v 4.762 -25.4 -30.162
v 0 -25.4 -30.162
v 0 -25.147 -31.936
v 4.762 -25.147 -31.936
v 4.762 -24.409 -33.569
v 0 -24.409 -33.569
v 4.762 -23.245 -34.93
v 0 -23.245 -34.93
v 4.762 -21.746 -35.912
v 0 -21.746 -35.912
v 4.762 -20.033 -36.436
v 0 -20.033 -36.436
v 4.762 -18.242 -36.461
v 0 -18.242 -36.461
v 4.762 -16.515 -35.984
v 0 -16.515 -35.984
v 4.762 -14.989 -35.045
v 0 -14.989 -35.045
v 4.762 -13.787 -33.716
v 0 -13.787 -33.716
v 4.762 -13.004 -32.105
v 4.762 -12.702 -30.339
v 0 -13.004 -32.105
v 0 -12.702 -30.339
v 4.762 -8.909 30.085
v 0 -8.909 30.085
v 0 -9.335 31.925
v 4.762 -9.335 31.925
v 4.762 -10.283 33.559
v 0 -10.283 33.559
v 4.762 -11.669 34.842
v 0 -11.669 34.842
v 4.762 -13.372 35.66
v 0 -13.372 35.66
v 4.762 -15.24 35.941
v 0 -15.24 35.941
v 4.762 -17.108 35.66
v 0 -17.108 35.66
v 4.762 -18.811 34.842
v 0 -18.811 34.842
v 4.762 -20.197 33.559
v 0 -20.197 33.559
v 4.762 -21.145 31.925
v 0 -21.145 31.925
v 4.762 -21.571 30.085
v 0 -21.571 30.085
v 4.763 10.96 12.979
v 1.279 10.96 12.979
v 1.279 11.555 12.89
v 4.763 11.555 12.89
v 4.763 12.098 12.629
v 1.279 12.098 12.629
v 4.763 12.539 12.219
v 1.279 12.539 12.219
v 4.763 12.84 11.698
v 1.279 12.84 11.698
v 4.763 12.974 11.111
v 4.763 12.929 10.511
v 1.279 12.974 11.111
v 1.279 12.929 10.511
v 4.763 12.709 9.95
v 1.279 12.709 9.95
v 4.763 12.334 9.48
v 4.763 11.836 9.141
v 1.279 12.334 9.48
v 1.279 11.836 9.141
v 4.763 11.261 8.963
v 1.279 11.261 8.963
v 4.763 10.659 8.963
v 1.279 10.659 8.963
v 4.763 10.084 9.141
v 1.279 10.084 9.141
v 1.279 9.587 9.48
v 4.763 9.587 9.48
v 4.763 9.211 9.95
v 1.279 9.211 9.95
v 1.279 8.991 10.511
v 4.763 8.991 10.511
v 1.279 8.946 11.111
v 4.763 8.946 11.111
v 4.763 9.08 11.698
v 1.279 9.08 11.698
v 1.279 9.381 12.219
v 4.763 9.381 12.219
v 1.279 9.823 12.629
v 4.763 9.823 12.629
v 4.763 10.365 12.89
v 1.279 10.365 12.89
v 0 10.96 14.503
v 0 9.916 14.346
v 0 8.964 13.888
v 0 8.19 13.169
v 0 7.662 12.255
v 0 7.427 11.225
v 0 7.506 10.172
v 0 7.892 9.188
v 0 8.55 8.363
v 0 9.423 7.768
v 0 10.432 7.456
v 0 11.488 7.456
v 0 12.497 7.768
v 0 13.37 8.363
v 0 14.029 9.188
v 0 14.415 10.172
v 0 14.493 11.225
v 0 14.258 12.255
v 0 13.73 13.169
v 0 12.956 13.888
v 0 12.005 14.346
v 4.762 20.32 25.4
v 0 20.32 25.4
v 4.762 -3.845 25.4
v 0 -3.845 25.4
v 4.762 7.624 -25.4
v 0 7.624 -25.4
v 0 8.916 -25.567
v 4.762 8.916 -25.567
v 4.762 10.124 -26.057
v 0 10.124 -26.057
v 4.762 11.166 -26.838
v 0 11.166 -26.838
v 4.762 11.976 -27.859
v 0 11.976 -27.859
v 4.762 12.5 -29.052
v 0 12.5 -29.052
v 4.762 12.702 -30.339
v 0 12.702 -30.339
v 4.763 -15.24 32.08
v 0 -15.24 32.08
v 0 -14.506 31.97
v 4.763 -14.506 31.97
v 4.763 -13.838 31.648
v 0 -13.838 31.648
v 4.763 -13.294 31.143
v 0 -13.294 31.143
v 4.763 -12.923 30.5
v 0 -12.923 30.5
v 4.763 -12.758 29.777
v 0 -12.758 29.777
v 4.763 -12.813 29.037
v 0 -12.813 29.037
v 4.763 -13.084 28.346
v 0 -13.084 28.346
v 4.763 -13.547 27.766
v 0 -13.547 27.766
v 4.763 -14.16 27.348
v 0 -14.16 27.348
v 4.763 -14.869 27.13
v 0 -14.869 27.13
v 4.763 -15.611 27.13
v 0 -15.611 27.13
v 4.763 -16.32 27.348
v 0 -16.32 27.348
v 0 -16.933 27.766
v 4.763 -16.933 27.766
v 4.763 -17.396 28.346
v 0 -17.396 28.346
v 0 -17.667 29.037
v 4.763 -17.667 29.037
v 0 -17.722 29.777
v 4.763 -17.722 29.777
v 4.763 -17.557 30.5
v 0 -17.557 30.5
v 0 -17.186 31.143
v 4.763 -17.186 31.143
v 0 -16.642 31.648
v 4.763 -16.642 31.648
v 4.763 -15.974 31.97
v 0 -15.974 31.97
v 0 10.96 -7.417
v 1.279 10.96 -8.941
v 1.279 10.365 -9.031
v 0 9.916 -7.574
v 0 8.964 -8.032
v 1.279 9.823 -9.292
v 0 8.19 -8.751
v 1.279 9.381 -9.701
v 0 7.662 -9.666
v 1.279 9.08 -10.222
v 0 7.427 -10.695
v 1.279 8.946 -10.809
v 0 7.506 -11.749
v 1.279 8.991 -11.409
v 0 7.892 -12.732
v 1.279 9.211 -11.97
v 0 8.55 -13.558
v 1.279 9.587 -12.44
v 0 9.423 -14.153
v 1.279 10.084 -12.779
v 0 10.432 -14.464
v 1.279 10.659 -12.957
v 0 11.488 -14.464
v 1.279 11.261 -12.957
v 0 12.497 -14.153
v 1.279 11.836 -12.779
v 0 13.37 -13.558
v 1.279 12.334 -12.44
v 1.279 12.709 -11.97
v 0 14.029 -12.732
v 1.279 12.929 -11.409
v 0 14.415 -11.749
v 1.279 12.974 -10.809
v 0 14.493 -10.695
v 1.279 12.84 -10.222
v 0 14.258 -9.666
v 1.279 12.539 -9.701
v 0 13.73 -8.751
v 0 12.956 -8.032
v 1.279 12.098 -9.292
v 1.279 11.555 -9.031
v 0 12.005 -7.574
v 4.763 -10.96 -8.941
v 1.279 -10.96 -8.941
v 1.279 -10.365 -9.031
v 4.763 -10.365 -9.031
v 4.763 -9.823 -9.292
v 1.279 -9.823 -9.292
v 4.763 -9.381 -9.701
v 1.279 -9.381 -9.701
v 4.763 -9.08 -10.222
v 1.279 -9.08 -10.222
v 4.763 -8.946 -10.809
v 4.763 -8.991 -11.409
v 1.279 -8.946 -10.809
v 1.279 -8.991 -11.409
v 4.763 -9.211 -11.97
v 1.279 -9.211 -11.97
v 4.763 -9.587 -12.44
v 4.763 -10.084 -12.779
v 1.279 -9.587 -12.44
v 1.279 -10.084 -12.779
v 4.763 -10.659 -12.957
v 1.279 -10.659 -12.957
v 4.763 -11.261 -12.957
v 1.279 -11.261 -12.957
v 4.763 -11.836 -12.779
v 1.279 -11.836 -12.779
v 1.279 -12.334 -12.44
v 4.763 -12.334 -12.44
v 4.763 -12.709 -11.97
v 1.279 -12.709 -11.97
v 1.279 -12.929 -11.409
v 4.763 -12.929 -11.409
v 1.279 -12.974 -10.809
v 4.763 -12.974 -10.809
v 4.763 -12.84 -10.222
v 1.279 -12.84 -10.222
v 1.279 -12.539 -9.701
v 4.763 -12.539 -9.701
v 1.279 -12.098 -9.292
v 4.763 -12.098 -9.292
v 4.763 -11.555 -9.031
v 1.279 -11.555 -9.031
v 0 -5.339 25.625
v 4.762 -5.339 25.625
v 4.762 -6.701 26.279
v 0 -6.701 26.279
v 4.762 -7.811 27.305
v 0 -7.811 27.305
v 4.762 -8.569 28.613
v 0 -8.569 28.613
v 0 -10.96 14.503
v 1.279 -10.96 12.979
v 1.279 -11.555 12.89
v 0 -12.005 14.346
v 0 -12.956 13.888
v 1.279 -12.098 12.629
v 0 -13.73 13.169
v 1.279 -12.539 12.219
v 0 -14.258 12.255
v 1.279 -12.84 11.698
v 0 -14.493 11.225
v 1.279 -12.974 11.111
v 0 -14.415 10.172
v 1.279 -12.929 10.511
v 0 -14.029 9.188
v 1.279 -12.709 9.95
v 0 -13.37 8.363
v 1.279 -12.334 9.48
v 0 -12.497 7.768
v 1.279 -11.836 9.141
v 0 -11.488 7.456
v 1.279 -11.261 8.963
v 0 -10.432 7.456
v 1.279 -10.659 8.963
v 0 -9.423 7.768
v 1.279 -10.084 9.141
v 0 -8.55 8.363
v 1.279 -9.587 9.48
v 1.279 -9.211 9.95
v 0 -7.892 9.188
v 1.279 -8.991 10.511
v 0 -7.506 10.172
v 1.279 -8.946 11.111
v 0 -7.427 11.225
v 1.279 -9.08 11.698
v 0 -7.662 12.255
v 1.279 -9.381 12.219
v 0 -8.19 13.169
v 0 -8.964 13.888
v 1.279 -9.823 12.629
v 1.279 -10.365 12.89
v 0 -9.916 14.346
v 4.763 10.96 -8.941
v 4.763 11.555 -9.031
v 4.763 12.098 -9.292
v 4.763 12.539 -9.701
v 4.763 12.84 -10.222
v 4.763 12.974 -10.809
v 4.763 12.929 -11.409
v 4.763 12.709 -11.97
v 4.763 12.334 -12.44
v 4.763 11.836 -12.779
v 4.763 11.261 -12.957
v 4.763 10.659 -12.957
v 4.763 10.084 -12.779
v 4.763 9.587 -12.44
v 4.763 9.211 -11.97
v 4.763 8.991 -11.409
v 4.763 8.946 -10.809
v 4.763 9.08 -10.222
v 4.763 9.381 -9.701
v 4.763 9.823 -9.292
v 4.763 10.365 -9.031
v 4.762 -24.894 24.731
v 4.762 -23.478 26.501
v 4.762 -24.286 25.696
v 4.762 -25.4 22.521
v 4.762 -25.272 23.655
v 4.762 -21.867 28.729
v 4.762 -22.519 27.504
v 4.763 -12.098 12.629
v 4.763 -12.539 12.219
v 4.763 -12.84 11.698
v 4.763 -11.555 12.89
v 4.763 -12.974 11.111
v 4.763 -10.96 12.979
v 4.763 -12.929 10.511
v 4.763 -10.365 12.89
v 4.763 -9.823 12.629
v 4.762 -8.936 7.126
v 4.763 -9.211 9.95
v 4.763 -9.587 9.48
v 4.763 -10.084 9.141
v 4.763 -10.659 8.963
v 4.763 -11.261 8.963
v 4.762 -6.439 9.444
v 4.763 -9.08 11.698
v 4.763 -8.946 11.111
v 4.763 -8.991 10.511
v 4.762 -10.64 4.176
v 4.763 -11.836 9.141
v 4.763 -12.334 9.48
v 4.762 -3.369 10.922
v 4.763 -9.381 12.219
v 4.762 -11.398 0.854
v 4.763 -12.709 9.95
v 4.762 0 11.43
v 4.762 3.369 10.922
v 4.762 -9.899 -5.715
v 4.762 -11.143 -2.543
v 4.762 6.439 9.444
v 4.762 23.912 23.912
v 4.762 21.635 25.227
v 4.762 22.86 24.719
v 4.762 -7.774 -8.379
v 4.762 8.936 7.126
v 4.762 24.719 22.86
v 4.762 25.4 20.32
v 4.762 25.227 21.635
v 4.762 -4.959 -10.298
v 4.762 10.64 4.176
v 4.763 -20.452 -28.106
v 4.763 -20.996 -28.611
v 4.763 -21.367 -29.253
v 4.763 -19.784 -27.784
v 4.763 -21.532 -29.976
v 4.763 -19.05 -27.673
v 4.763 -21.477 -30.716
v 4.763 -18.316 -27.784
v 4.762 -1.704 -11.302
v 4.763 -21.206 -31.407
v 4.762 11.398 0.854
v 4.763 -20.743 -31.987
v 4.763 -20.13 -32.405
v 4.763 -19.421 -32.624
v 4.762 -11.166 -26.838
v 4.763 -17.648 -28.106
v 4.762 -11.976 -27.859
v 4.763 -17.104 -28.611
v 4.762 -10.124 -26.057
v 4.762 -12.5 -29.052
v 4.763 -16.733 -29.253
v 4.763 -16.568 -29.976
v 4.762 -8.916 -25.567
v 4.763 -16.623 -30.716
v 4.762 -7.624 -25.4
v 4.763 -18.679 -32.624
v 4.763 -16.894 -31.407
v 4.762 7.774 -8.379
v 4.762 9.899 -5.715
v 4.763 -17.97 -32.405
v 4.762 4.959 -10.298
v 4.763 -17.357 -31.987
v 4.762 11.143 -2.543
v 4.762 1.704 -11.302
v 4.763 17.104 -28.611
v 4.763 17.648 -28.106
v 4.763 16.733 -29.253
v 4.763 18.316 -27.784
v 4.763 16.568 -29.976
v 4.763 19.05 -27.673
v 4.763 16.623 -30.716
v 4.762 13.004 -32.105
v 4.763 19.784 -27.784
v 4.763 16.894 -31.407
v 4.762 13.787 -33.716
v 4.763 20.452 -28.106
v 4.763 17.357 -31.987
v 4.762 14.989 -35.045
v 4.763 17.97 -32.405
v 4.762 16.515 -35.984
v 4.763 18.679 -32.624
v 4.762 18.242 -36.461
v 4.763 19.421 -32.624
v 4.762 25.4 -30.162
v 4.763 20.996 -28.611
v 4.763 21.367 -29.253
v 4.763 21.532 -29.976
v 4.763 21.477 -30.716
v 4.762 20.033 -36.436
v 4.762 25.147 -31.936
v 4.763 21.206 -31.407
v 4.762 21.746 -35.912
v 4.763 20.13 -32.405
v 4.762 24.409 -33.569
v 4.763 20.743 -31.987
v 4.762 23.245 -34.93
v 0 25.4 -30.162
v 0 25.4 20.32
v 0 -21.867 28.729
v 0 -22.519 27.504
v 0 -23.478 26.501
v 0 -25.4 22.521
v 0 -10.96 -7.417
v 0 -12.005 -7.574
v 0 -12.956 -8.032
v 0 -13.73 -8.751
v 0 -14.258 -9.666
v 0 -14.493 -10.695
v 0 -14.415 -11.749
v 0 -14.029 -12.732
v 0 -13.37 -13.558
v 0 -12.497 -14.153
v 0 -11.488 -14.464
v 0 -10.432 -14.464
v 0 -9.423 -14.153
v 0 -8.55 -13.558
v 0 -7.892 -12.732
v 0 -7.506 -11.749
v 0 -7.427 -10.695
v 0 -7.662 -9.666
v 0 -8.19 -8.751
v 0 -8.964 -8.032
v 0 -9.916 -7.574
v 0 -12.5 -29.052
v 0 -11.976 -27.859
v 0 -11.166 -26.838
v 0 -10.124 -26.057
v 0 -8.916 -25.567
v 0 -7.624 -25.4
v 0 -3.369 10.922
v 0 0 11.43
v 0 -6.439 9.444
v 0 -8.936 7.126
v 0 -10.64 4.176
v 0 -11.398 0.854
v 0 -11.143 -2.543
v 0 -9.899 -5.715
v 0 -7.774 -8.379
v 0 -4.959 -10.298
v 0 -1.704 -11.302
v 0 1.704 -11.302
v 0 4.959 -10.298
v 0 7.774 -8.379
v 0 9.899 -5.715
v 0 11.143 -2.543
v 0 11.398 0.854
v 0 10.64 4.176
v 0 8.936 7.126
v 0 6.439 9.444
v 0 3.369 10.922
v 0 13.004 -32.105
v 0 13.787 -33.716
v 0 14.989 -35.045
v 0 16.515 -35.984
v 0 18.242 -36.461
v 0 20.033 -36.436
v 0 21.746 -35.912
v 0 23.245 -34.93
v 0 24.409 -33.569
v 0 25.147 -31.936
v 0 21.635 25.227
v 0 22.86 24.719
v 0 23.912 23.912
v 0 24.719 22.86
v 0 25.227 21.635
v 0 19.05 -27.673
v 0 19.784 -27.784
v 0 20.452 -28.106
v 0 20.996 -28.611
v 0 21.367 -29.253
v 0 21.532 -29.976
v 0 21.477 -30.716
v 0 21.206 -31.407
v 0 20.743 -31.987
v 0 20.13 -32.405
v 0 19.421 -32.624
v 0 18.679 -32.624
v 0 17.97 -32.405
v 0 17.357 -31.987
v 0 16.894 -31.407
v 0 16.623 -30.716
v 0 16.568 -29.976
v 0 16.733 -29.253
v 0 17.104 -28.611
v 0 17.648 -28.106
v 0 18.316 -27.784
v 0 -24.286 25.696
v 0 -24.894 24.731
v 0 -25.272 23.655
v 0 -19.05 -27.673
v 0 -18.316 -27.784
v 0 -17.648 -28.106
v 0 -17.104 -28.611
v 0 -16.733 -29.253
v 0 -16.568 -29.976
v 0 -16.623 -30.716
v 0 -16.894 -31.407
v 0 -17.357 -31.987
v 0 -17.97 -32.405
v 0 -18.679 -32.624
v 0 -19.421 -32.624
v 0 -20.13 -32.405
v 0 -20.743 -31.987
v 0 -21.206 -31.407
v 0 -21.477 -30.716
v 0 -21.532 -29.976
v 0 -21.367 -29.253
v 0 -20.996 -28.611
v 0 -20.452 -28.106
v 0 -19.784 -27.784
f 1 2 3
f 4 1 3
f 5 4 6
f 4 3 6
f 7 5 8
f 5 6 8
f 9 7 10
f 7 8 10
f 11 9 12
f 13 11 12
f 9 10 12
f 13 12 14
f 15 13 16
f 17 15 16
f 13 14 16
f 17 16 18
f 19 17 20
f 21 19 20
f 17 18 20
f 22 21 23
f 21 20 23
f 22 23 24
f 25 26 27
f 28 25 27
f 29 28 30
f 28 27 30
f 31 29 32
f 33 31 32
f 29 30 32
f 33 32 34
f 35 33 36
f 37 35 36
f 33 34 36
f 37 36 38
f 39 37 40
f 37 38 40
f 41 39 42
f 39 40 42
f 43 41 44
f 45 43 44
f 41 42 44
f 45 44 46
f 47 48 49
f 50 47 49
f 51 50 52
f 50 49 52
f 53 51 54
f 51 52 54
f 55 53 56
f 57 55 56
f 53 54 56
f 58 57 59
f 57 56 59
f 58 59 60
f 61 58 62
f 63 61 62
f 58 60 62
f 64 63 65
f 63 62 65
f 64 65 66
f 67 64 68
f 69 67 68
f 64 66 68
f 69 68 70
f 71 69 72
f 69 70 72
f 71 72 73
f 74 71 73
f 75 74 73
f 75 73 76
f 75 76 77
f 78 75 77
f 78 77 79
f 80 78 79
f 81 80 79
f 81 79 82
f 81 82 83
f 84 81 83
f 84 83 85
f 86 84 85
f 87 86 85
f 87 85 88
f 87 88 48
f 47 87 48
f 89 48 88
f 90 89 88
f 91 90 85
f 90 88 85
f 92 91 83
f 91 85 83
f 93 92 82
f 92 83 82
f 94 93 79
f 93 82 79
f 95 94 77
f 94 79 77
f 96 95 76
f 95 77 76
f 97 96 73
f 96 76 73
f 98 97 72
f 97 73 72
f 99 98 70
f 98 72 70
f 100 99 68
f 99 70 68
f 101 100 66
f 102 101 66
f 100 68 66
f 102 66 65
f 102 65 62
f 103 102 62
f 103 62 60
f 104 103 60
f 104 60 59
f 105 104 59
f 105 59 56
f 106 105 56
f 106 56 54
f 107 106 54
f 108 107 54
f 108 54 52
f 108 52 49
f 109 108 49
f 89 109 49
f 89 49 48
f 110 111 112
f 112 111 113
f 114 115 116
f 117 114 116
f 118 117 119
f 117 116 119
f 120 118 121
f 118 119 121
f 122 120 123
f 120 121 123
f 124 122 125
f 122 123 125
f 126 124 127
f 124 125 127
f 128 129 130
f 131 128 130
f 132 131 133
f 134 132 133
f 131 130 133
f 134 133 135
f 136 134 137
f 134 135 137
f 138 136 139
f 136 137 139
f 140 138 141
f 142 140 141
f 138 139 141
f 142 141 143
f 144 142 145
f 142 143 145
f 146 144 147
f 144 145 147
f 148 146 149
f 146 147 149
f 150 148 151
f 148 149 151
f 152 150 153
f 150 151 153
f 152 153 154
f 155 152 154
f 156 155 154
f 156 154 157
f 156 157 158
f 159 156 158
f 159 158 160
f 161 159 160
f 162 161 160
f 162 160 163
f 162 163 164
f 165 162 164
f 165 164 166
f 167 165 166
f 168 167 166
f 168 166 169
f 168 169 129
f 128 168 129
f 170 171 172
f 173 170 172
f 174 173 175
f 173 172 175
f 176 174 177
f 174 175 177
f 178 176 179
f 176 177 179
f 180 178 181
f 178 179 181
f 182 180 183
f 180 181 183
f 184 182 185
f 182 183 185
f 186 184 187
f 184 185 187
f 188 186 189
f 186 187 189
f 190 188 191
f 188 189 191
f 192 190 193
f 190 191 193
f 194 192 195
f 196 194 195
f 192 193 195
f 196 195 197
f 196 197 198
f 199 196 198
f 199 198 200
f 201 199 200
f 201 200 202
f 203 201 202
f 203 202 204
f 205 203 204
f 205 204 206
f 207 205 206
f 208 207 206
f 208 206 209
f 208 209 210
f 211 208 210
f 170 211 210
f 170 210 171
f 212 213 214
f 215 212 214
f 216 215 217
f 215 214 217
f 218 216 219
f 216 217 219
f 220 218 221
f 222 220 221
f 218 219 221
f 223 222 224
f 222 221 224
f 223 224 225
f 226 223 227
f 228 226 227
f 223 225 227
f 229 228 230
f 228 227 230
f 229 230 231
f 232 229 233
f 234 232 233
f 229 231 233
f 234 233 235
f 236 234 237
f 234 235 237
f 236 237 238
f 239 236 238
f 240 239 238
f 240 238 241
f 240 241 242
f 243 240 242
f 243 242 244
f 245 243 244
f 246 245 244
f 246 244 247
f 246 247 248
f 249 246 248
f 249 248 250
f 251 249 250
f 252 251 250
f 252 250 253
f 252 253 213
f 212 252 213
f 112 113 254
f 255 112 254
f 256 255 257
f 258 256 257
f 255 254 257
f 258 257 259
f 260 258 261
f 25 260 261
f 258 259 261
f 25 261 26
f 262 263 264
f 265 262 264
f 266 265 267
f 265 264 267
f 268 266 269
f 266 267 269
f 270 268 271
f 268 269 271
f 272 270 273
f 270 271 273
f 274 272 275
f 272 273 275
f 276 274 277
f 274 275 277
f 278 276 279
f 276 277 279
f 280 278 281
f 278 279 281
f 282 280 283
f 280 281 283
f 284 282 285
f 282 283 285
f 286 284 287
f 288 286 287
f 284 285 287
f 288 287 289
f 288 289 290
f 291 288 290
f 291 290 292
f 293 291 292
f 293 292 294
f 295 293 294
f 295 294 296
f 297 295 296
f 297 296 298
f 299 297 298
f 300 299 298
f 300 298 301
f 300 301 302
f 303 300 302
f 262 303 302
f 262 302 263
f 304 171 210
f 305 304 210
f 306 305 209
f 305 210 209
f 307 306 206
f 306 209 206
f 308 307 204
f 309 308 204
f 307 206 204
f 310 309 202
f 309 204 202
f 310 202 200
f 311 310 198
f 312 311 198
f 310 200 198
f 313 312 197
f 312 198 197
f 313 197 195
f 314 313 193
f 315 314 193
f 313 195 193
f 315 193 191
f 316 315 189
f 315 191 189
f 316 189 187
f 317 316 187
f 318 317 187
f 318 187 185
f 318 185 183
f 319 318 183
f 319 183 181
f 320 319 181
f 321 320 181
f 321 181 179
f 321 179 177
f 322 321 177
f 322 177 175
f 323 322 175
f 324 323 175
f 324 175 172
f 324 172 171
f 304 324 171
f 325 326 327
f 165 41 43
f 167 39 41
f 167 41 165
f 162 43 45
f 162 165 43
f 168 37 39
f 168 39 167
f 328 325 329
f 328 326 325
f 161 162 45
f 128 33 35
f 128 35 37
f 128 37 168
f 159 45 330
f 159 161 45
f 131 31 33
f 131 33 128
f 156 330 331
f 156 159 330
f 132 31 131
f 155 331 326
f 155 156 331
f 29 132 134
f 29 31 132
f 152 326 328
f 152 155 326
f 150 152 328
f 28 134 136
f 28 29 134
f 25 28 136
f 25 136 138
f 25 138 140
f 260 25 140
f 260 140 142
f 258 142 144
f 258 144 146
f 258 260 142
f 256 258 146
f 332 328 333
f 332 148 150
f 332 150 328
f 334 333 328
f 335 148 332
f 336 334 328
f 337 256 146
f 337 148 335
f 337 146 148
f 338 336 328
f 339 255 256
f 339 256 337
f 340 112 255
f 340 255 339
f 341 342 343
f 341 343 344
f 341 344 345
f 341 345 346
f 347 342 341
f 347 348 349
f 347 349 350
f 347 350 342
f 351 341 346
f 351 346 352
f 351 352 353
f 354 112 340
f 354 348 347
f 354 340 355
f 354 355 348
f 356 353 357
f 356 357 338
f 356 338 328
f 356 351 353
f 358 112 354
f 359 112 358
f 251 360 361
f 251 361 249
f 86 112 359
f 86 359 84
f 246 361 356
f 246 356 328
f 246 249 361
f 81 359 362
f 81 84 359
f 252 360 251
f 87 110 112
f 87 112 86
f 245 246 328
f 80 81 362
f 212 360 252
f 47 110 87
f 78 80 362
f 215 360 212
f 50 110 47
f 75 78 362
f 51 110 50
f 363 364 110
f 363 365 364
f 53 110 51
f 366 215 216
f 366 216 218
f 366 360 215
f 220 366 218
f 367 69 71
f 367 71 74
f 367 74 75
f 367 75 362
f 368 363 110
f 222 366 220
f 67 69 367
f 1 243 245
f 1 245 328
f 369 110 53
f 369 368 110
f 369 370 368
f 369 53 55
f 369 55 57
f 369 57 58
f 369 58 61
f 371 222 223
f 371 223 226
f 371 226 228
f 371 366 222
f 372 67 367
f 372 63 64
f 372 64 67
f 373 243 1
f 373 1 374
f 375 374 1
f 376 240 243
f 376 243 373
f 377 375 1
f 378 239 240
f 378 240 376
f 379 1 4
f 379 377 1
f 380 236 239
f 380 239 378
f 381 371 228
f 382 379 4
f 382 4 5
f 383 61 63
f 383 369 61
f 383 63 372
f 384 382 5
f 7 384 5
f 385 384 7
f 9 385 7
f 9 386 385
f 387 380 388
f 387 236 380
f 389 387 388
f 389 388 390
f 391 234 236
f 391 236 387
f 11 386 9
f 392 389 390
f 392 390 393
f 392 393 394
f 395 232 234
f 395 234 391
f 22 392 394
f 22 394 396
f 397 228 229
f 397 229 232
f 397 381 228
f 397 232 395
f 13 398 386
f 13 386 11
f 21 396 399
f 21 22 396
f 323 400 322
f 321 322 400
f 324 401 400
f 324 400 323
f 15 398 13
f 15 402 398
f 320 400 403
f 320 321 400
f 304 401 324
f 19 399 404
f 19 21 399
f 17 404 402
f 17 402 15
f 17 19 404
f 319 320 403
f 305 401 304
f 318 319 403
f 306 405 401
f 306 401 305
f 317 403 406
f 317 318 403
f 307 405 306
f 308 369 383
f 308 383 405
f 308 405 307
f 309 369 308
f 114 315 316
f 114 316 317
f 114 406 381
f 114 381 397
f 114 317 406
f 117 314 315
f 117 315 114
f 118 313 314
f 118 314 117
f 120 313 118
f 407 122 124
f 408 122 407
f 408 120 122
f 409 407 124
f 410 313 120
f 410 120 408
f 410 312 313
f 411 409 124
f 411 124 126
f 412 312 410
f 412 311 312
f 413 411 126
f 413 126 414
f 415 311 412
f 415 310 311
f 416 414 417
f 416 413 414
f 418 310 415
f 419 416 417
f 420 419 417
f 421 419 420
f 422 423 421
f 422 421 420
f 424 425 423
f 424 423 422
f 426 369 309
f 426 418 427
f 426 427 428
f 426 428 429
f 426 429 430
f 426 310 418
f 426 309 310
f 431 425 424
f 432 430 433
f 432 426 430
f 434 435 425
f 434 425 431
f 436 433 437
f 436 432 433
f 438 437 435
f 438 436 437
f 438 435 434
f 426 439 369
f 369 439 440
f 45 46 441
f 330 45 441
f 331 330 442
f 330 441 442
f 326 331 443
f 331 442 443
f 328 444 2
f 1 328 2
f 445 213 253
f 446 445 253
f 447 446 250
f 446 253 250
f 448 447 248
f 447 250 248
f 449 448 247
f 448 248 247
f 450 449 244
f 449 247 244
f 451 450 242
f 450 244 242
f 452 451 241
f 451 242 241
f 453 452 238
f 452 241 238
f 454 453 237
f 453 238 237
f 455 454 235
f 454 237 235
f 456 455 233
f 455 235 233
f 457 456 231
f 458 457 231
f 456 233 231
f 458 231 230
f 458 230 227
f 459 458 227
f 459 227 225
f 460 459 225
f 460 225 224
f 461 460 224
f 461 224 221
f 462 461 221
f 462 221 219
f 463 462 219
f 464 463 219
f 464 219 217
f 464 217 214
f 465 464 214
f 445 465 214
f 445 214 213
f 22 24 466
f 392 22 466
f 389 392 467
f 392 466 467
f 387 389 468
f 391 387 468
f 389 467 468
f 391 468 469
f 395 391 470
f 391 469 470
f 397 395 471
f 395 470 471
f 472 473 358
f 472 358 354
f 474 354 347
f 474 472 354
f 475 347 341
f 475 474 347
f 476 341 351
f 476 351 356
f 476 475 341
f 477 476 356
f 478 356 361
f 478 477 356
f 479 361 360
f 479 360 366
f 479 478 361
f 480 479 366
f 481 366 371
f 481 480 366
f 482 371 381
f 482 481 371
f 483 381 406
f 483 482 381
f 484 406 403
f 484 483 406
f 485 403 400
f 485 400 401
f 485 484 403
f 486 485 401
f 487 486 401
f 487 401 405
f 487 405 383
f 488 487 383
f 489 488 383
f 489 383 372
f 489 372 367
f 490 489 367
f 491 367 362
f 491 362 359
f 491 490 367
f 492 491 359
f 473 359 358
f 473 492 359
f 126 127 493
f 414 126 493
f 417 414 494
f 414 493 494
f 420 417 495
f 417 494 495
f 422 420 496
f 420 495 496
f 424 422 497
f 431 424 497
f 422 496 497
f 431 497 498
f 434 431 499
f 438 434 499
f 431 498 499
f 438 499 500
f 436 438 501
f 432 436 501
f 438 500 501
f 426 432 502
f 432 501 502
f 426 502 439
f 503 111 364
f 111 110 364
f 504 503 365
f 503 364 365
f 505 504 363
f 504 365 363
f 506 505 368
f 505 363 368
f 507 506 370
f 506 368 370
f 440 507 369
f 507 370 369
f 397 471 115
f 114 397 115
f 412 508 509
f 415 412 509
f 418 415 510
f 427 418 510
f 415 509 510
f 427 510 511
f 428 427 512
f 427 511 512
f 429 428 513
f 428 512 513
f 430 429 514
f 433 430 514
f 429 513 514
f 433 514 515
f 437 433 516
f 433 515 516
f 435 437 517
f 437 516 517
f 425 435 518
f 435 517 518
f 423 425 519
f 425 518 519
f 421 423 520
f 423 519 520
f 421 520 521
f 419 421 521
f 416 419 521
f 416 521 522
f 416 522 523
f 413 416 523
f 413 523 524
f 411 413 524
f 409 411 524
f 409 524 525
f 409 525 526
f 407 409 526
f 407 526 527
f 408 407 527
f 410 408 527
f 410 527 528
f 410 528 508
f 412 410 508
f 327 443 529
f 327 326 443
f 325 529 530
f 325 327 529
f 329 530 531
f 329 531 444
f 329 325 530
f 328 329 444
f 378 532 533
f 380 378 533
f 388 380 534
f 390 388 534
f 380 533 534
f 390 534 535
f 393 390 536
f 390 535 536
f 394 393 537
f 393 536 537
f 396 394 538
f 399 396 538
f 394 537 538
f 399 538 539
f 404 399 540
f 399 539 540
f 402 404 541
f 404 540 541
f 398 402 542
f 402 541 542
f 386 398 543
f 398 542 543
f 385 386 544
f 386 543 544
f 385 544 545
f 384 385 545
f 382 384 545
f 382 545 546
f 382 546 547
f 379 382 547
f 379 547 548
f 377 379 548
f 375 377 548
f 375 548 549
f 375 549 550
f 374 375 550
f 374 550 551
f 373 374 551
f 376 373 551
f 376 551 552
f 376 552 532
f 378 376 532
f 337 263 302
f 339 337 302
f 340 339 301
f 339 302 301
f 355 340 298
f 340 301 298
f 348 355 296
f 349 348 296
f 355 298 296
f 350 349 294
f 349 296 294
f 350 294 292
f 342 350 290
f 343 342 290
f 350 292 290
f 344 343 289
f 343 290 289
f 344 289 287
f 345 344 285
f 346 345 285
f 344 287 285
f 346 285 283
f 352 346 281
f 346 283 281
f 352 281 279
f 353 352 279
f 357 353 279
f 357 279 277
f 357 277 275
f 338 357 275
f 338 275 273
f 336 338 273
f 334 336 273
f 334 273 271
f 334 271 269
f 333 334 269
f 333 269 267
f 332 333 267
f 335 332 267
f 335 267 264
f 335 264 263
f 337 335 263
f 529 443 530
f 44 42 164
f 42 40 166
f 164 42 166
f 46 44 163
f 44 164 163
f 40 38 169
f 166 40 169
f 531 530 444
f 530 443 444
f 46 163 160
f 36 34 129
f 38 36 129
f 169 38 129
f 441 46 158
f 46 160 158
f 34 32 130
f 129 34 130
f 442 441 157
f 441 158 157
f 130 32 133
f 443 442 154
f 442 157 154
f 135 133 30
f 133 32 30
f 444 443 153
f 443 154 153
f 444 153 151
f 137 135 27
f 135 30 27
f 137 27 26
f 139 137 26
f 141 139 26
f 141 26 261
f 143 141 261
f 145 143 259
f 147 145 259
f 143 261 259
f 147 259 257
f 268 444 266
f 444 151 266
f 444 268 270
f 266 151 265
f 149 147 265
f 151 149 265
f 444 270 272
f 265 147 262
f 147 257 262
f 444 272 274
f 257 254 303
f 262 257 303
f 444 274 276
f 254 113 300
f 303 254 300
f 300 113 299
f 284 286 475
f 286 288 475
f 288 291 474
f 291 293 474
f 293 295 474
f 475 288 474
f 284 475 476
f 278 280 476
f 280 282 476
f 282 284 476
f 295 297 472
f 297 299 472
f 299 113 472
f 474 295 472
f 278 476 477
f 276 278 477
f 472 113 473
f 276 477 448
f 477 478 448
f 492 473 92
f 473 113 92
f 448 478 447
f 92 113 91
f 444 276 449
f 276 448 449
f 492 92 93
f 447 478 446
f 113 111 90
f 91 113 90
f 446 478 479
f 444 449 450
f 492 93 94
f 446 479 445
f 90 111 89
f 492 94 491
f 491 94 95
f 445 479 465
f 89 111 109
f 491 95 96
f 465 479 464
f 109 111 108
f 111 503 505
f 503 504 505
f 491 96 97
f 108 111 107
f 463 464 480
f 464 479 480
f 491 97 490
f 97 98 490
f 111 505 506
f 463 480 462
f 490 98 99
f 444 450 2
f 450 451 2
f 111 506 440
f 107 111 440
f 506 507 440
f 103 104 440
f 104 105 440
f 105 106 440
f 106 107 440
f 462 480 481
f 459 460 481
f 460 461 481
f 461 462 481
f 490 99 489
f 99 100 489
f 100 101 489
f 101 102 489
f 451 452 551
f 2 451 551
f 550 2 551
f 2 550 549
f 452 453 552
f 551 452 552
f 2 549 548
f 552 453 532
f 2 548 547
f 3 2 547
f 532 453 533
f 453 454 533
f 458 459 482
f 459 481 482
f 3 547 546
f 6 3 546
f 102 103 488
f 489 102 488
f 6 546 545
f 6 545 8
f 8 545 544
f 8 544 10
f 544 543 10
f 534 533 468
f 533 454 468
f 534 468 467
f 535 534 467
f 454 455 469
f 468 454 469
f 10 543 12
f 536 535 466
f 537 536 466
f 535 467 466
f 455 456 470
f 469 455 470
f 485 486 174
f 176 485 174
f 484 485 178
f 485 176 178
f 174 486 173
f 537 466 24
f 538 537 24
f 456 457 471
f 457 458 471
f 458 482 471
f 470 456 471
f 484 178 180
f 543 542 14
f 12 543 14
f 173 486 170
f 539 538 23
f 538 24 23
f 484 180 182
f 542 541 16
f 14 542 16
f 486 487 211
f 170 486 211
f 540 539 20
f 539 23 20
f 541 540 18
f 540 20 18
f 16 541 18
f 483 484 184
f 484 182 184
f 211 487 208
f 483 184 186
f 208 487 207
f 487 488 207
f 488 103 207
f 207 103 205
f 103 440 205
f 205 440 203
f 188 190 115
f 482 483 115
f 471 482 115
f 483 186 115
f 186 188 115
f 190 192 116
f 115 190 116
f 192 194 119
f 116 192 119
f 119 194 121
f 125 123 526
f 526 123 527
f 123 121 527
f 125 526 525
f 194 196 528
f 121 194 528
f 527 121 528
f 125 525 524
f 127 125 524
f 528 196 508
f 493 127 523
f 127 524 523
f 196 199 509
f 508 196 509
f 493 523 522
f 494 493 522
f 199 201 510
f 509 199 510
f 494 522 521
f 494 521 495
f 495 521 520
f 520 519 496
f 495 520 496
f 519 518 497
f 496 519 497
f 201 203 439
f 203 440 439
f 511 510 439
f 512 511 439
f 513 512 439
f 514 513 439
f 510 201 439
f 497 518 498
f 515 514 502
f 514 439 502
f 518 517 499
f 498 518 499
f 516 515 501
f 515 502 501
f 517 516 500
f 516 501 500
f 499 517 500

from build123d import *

# Parameters (mm, degrees)
SKETCH1_R                                         = 11.43
BOSS_EXTRUDE1_DEPTH                               = 4.7625
F_10_32_TAPPED_HOLE1_D                            = 4.0386
F_10_CLEARANCE_HOLE1_D                            = 4.9784
FILLET1_R                                         = 5.08
CSK_FOR_6_FLAT_HEAD_MACHINE_SCREW_100_D           = 3.7973
CSK_FOR_6_FLAT_HEAD_MACHINE_SCREW_100_CSINK_D     = 7.0866
CSK_FOR_6_FLAT_HEAD_MACHINE_SCREW_100_CSINK_ANGLE = 100


with BuildPart() as part:
    # Sketch1 → Boss-Extrude1 (new body)
    with BuildSketch(Plane(origin=(0, 0, 0), x_dir=(0, 0, -1), z_dir=(1, 0, 0))):
        with BuildLine():
            Line((-25.4, 25.4), (-25.4, -3.844624666))
            ThreePointArc((-25.4, -3.844624666), (-26.750820168, -7.294206927), (-30.084888889, -8.909235926))
            ThreePointArc((-30.084888889, -8.909235926), (-35.941, -15.24), (-30.084888889, -21.570764074))
            ThreePointArc((-30.084888889, -21.570764074), (-27.201538941, -22.75489945), (-25.552500859, -25.4))
            Line((-25.552500859, -25.4), (-25.4, -25.4))
            Line((-25.4, -25.4), (25.4, -25.4))
            Line((25.4, -25.4), (30.1625, -25.4))
            ThreePointArc((30.1625, -25.4), (36.511887391, -19.138202954), (30.338888889, -12.702450318))
            ThreePointArc((30.338888889, -12.702450318), (26.83834897, -11.166271352), (25.4, -7.624410573))
            Line((25.4, -7.624410573), (25.4, 7.624410573))
            ThreePointArc((25.4, 7.624410573), (26.83834897, 11.166271352), (30.338888889, 12.702450318))
            ThreePointArc((30.338888889, 12.702450318), (36.511887391, 19.138202954), (30.1625, 25.4))
            Line((30.1625, 25.4), (25.4, 25.4))
            Line((25.4, 25.4), (-25.4, 25.4))
        make_face()
        with Locations(Location((0, 0, 0), (0, 0, 180))):
            Circle(SKETCH1_R, mode=Mode.SUBTRACT)
    extrude(amount=BOSS_EXTRUDE1_DEPTH)

    # #10-32 Tapped Hole1 (through all)
    with Locations(Plane(origin=(4.7625, 0, 0), x_dir=(0, 0, -1), z_dir=(1, 0, 0))):
        with Locations((-10.9601, 10.9601), (-10.9601, -10.9601), (10.9601, -10.9601), (10.9601, 10.9601)):
            Hole(F_10_32_TAPPED_HOLE1_D / 2)

    # #10 Clearance Hole1 (through all)
    with Locations(Plane(origin=(4.7625, 0, 0), x_dir=(0, 0, -1), z_dir=(1, 0, 0))):
        with Locations((-29.591, -15.24), (30.1625, 19.05), (30.1625, -19.05)):
            Hole(F_10_CLEARANCE_HOLE1_D / 2)

    # Fillet1
    fillet1_edges = [part.edges().sort_by_distance(p)[0] for p in [
        (2.38125, -25.4, 25.552500859),
        (2.38125, 25.4, 25.4),
    ]]
    fillet(fillet1_edges, radius=FILLET1_R)

    # CSK for #6 Flat Head Machine Screw (100)1 (through all)
    with Locations(Plane(origin=(0, 10.9601, 10.9601), x_dir=(0, 0, -1), z_dir=(-1, 0, 0))):
        with Locations((0, 0), (0, 21.9202), (21.9202, 21.9202), (21.9202, 0)):
            CounterSinkHole(CSK_FOR_6_FLAT_HEAD_MACHINE_SCREW_100_D / 2, CSK_FOR_6_FLAT_HEAD_MACHINE_SCREW_100_CSINK_D / 2, counter_sink_angle=CSK_FOR_6_FLAT_HEAD_MACHINE_SCREW_100_CSINK_ANGLE)


solid = part.part
